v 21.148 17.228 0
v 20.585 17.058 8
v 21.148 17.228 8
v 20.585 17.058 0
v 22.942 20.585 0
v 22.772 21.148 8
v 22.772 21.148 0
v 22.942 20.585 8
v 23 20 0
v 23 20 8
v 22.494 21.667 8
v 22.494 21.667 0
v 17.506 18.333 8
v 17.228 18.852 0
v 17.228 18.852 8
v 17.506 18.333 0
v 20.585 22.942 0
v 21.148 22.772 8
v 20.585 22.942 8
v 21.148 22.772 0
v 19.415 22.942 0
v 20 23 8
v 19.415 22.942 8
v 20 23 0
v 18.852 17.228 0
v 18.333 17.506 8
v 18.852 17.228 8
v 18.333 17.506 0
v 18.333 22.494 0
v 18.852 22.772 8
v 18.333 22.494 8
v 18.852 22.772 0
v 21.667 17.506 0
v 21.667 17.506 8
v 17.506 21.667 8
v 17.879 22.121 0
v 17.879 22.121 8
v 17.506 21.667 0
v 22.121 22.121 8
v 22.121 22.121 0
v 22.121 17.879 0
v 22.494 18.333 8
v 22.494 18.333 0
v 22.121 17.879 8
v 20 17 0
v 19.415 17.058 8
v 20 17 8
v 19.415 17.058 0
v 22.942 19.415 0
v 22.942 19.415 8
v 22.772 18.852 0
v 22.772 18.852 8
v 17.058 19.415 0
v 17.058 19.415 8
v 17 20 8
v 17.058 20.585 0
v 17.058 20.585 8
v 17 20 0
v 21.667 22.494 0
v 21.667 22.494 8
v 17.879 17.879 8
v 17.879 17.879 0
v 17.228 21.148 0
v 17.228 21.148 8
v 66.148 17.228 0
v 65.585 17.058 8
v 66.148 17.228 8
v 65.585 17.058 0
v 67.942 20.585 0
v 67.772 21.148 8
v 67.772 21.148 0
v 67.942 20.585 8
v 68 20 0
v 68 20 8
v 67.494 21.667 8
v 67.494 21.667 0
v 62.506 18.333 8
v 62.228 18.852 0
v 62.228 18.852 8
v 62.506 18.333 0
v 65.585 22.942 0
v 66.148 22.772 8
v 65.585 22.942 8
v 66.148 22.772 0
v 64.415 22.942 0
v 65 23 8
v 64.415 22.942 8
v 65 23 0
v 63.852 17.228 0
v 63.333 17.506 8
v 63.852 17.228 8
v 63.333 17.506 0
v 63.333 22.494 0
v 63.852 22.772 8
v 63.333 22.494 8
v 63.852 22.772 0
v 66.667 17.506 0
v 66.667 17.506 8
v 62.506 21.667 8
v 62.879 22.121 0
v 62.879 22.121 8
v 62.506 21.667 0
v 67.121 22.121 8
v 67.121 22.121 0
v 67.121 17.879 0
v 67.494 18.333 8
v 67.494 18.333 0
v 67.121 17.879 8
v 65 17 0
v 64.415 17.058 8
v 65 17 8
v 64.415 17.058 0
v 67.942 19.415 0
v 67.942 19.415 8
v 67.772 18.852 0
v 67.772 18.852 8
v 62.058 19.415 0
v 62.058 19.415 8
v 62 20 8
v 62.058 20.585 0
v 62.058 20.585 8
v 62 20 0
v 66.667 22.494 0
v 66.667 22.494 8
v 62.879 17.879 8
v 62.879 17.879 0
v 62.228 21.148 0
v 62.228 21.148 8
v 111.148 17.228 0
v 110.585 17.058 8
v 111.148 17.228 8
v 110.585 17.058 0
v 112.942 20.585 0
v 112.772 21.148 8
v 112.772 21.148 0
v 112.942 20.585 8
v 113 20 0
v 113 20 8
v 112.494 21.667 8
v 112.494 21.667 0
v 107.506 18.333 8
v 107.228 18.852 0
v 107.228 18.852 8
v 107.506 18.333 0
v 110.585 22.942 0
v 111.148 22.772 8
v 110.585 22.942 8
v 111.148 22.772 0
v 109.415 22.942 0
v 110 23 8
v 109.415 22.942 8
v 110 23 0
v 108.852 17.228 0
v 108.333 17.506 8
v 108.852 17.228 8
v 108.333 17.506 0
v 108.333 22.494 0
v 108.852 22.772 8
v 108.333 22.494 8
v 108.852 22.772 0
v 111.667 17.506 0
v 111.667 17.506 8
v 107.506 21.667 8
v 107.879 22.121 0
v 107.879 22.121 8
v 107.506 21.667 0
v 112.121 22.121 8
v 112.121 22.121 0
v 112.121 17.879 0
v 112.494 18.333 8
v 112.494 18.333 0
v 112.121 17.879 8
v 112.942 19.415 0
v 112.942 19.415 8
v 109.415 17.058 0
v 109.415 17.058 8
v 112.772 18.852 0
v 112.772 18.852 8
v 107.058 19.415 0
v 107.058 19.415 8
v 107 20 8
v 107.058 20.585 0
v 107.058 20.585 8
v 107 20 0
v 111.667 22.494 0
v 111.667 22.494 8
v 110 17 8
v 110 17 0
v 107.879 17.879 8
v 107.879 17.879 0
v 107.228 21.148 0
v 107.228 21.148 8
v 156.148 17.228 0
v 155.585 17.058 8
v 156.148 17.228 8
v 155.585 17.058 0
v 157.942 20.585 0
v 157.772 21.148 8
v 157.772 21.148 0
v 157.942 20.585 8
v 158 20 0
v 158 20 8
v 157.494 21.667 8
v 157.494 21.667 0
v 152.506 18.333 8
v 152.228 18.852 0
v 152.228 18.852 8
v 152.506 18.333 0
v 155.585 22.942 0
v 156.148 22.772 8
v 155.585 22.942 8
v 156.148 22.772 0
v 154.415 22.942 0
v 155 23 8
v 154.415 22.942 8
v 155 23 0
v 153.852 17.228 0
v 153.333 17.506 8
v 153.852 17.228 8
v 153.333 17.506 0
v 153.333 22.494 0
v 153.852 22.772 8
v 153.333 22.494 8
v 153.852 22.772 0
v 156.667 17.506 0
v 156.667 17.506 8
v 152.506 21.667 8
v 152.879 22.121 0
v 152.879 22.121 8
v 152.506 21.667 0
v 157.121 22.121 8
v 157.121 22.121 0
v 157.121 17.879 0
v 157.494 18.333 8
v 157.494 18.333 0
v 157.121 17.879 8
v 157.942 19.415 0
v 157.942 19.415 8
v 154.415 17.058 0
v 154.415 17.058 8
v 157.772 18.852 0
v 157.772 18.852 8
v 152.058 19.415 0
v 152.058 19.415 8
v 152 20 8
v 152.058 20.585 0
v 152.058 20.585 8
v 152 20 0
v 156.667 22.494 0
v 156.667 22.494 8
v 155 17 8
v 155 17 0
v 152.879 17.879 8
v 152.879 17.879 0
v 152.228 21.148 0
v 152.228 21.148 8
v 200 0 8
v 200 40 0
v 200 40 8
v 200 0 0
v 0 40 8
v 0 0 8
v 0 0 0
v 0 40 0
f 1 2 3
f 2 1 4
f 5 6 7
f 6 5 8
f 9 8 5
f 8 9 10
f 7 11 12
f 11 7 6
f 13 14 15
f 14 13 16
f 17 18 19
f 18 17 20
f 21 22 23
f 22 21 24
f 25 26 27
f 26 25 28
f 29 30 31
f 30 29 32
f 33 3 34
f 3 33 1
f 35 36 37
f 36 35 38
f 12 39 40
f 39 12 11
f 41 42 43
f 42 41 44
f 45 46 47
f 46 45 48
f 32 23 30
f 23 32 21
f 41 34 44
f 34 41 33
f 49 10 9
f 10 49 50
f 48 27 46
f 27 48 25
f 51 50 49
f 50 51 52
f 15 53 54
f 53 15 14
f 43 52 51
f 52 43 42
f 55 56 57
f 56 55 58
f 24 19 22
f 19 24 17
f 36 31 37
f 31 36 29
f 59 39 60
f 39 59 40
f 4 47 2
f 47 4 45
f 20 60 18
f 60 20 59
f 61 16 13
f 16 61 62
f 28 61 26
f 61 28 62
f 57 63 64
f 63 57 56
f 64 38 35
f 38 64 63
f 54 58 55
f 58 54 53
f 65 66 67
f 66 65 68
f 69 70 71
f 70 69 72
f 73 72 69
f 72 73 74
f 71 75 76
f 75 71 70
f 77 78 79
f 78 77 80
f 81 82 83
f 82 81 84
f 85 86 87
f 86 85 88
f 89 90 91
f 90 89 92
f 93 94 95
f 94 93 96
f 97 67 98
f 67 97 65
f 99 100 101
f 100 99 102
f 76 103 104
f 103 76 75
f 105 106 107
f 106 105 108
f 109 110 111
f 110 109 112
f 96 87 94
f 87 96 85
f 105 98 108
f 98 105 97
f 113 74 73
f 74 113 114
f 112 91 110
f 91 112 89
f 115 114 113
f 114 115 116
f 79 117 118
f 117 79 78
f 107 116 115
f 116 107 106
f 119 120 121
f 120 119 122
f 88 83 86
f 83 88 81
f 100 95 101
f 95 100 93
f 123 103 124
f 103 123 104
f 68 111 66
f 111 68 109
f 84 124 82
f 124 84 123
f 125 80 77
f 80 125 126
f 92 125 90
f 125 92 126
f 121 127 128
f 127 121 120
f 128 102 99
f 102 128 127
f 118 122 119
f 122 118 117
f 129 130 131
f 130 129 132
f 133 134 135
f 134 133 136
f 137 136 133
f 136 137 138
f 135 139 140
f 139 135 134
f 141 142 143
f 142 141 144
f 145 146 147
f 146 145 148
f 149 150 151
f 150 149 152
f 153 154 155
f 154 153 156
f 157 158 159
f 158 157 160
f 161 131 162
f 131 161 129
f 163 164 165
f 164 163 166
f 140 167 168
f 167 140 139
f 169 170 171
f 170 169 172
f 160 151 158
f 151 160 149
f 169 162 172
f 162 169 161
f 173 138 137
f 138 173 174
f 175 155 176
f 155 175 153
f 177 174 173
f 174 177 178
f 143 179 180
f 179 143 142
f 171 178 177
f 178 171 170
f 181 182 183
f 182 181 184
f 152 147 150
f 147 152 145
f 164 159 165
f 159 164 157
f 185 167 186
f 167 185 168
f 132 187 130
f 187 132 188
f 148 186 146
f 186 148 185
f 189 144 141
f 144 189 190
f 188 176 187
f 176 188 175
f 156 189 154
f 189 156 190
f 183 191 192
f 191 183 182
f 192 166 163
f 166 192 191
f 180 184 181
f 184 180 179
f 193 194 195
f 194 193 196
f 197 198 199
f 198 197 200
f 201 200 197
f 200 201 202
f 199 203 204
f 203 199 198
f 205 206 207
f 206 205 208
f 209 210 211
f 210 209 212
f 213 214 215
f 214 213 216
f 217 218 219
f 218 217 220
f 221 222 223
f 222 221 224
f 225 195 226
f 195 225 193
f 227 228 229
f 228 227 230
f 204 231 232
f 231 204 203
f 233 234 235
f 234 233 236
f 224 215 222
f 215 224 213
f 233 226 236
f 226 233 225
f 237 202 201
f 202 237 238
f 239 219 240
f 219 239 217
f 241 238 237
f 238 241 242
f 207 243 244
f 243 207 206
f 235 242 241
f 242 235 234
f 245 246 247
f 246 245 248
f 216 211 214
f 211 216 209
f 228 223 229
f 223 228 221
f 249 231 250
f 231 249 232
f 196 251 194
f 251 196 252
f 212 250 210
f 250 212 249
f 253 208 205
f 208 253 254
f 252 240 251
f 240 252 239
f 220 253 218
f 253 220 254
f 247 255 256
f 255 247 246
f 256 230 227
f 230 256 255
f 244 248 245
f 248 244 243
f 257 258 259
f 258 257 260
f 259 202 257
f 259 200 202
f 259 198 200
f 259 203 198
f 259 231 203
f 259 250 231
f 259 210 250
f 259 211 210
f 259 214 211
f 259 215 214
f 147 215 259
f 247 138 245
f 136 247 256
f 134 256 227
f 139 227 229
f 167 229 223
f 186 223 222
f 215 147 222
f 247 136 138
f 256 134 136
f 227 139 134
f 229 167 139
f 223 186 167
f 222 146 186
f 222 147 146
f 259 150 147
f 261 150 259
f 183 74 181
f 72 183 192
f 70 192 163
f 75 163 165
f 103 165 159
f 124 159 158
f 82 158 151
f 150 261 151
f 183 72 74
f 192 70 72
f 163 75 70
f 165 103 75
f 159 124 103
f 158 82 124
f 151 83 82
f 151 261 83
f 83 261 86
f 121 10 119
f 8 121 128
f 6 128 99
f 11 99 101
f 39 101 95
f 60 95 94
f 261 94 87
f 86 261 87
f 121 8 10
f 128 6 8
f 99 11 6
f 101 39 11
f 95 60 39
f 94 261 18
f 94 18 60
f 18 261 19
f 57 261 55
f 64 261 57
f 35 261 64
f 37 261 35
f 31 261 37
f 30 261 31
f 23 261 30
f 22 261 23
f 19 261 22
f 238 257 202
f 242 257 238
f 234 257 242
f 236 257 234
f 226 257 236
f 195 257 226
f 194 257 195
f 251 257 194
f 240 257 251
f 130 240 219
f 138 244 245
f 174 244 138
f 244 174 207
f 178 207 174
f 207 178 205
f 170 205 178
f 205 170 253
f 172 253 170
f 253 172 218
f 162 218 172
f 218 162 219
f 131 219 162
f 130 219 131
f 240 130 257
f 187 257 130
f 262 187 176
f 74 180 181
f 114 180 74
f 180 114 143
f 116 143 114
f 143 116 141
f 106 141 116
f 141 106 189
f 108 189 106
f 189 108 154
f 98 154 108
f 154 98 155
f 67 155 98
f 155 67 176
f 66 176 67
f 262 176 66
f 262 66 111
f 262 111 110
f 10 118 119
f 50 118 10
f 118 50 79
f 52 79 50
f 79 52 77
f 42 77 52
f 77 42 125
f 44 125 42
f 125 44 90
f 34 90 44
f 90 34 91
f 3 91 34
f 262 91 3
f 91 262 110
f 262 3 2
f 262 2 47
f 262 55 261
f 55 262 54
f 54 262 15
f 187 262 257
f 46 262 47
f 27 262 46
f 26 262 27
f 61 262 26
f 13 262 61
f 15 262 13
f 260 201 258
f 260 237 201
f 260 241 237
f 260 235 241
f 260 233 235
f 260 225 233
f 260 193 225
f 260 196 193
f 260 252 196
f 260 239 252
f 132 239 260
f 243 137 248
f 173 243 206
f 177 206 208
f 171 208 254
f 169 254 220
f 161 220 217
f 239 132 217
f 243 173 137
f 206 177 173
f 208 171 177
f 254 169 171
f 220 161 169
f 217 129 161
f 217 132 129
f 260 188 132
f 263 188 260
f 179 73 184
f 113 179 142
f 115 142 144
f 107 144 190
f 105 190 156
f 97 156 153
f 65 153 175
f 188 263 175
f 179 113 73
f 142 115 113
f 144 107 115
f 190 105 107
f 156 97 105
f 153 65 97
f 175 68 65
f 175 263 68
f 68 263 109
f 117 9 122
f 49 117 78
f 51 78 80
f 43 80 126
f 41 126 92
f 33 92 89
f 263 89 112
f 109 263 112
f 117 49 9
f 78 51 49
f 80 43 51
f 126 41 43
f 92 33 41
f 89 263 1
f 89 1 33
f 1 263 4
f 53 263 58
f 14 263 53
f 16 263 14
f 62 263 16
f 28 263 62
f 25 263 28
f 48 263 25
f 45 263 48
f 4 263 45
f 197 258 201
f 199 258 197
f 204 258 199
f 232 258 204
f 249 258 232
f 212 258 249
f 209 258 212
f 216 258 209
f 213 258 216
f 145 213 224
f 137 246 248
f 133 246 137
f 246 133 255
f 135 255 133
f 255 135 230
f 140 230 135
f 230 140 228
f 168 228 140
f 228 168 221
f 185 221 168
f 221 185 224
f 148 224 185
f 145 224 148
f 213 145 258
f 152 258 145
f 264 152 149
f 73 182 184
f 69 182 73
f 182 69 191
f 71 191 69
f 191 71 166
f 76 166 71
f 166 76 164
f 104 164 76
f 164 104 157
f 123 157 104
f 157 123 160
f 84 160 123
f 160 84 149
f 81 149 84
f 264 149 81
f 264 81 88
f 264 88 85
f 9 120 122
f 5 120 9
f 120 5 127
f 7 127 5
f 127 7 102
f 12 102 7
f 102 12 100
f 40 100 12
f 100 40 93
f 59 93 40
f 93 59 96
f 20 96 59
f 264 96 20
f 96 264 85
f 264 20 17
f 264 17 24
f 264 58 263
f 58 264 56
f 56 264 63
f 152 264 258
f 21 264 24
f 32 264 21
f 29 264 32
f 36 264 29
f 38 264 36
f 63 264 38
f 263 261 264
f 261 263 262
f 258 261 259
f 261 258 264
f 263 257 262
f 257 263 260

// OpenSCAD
$fn = 32;

// ----------------------------------------------------------------------
// Long rail: 200-250 mm mounting rail
// ----------------------------------------------------------------------

// --- parameters (mm) ---
rail_l = 200;             // rail length, X
rail_w = 40;              // rail width, Y
rail_t = 8;               // rail thickness, Z
hole_d = 6;               // mounting hole diameter
hole_start = 20;          // first hole offset from the end
hole_pitch = 45;          // hole pitch
holes = 4;                // number of holes

difference() {
  cube([rail_l, rail_w, rail_t]);
  for (i = [0 : holes - 1])
    translate([hole_start + i * hole_pitch, rail_w / 2, -1])
      cylinder(h = rail_t + 2, d = hole_d);
}
